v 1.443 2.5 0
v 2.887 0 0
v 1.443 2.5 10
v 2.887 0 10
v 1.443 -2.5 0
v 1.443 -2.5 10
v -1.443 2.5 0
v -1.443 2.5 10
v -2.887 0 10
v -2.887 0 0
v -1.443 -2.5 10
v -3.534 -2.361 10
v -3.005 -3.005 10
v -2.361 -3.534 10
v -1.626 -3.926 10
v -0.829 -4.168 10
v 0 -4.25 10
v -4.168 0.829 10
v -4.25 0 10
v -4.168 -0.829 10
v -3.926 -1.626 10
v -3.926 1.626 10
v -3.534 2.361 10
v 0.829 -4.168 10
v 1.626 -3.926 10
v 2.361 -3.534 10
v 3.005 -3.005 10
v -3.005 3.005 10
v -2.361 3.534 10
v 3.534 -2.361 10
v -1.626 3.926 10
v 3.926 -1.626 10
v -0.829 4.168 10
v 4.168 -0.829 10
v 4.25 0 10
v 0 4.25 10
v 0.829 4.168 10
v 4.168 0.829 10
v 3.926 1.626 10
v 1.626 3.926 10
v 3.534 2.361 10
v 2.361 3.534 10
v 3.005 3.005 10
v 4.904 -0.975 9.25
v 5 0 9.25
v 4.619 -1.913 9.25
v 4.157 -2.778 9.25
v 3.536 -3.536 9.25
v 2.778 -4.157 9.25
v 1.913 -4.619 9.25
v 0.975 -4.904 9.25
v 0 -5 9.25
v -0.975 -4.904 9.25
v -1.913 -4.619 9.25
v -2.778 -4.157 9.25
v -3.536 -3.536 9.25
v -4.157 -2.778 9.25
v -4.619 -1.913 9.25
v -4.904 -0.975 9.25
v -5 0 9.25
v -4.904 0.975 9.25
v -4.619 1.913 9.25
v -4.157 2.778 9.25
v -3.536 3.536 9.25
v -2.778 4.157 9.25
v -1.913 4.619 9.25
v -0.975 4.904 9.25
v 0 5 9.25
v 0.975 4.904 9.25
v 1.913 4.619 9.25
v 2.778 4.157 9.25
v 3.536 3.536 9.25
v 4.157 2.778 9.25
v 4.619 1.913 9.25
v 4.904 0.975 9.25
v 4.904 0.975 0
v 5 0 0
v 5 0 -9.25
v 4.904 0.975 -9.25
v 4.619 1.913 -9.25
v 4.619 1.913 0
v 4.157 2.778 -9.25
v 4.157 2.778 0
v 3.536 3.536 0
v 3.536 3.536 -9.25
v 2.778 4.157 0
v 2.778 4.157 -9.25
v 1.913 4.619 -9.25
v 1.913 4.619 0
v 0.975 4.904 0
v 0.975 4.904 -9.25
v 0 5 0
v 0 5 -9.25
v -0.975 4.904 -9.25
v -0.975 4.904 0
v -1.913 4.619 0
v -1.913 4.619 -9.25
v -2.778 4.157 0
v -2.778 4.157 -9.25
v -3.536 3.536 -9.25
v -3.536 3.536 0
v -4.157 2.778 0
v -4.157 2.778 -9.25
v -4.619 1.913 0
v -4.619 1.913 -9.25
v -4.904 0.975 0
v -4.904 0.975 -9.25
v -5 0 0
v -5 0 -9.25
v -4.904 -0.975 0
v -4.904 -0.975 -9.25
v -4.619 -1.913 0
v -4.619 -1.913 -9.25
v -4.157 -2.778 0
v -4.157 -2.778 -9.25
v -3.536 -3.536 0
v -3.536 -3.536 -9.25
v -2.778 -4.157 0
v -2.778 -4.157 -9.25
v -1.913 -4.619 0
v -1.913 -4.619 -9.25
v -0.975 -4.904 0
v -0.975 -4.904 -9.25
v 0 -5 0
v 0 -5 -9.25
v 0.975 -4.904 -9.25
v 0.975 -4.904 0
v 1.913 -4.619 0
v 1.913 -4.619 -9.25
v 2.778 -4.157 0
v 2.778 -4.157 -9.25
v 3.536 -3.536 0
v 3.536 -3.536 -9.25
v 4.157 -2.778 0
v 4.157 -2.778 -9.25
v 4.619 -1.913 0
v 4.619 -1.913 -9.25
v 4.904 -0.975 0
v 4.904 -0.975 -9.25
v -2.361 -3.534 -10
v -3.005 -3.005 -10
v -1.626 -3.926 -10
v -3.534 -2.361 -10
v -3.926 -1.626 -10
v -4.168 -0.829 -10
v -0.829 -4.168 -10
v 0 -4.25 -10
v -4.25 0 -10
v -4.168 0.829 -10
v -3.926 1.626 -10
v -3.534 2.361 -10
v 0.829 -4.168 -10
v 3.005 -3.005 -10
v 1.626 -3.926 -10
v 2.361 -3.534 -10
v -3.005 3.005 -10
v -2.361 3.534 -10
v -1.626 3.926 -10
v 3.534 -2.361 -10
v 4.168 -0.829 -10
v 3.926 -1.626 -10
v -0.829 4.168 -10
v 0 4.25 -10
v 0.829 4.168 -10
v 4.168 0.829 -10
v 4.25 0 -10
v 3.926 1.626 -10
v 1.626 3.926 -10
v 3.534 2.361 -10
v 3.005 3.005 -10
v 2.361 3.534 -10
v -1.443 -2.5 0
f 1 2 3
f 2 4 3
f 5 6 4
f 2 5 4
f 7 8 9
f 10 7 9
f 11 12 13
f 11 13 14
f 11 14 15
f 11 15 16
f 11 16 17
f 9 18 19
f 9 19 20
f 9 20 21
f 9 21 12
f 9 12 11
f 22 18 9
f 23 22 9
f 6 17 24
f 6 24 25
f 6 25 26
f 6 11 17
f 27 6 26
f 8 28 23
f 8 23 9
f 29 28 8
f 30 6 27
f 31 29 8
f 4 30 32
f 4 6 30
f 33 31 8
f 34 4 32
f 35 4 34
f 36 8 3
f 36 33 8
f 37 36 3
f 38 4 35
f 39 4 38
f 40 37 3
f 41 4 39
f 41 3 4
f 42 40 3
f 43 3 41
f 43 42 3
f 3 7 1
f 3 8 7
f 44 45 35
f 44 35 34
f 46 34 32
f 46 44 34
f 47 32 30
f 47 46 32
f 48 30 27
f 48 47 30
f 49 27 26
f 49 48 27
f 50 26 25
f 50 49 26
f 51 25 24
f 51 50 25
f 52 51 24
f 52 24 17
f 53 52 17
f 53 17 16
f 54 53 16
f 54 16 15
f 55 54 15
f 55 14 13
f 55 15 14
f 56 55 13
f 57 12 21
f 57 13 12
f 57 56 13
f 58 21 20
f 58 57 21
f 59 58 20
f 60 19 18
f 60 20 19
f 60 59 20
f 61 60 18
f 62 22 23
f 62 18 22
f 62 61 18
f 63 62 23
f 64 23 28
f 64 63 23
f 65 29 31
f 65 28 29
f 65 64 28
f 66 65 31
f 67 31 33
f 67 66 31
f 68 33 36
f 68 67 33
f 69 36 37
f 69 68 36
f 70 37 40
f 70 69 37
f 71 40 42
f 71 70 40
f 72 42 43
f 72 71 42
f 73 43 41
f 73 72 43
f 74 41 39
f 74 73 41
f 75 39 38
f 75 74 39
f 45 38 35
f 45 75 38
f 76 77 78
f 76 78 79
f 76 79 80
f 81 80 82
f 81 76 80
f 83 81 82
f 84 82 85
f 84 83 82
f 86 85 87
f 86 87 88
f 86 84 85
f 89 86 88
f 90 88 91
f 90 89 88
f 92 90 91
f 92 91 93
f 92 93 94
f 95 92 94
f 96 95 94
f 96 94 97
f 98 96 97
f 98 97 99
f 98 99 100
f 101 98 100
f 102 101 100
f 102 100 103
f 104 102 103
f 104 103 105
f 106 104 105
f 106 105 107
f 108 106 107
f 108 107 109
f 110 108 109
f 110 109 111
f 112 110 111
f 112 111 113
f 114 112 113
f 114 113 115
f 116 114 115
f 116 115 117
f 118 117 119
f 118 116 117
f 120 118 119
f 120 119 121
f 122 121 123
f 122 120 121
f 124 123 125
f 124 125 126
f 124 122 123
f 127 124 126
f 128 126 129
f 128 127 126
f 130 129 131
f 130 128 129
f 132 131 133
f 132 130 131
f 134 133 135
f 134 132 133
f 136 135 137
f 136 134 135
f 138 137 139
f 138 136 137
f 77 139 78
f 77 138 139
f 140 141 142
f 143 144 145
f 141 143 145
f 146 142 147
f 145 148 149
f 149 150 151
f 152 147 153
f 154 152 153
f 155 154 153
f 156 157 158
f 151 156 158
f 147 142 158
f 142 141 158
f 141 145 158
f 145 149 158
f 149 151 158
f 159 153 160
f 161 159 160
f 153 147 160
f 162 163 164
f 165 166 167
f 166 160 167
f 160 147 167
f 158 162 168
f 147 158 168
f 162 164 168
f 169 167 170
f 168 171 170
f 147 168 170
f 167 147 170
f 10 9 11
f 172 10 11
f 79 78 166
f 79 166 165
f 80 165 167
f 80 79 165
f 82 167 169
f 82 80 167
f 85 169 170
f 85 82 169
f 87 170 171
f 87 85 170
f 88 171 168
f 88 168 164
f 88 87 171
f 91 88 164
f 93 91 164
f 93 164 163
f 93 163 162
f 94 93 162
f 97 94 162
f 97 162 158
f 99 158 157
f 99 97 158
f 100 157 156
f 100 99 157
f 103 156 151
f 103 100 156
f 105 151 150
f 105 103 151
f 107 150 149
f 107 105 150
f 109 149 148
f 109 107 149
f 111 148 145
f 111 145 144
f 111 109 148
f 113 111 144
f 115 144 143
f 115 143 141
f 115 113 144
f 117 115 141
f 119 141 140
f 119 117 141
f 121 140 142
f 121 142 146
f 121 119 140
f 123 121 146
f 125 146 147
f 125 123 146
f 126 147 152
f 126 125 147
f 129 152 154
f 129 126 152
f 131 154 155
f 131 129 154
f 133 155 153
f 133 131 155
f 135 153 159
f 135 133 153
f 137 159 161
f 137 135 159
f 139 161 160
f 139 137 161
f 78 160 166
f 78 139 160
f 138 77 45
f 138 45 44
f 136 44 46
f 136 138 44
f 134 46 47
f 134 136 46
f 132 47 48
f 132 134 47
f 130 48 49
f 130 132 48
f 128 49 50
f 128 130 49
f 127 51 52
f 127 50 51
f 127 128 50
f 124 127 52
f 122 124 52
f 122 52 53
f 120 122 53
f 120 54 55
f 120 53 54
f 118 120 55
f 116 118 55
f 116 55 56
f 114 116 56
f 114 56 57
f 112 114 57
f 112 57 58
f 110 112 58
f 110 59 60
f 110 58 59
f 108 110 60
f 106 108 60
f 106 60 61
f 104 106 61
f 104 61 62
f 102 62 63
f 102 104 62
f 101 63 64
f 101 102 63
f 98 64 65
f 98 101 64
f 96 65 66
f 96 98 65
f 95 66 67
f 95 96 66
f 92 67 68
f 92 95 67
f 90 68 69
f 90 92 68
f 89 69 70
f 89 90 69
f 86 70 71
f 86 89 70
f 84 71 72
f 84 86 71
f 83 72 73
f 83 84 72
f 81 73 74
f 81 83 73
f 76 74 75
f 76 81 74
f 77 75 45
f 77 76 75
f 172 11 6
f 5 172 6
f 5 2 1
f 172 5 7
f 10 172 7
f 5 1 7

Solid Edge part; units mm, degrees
sketch "Sketch1" plane through (0, 0, 0) normal (0, 0, 1) x (1, 0, 0)
  circle A0 centre (0, 0) radius 5
  dimension "D1" = 10
extrude "Protrusion1" add sketch "Sketch1" along normal mid plane 20
chamfer "Chamfer1" distance 0.75 angle 45 2 edges at (-5, 0, -10) (-5, 0, 10)
sketch "Sketch2" plane through (0, 0, 10) normal (0, 0, 1) x (1, 0, 0)
  line L0 (-1.4434, 2.5) -> (1.4434, 2.5)
  line L1 (2.8868, 0) -> (1.4434, 2.5)
  line L2 (1.4434, -2.5) -> (2.8868, 0)
  line L3 (-1.4434, -2.5) -> (1.4434, -2.5)
  line L4 (-2.8868, 0) -> (-1.4434, -2.5)
  line L5 (-1.4434, 2.5) -> (-2.8868, 0)
  dimension "D1" = 5
extrude "Cutout1" cut sketch "Sketch2" against normal blind 10
properties part number "24104618"
